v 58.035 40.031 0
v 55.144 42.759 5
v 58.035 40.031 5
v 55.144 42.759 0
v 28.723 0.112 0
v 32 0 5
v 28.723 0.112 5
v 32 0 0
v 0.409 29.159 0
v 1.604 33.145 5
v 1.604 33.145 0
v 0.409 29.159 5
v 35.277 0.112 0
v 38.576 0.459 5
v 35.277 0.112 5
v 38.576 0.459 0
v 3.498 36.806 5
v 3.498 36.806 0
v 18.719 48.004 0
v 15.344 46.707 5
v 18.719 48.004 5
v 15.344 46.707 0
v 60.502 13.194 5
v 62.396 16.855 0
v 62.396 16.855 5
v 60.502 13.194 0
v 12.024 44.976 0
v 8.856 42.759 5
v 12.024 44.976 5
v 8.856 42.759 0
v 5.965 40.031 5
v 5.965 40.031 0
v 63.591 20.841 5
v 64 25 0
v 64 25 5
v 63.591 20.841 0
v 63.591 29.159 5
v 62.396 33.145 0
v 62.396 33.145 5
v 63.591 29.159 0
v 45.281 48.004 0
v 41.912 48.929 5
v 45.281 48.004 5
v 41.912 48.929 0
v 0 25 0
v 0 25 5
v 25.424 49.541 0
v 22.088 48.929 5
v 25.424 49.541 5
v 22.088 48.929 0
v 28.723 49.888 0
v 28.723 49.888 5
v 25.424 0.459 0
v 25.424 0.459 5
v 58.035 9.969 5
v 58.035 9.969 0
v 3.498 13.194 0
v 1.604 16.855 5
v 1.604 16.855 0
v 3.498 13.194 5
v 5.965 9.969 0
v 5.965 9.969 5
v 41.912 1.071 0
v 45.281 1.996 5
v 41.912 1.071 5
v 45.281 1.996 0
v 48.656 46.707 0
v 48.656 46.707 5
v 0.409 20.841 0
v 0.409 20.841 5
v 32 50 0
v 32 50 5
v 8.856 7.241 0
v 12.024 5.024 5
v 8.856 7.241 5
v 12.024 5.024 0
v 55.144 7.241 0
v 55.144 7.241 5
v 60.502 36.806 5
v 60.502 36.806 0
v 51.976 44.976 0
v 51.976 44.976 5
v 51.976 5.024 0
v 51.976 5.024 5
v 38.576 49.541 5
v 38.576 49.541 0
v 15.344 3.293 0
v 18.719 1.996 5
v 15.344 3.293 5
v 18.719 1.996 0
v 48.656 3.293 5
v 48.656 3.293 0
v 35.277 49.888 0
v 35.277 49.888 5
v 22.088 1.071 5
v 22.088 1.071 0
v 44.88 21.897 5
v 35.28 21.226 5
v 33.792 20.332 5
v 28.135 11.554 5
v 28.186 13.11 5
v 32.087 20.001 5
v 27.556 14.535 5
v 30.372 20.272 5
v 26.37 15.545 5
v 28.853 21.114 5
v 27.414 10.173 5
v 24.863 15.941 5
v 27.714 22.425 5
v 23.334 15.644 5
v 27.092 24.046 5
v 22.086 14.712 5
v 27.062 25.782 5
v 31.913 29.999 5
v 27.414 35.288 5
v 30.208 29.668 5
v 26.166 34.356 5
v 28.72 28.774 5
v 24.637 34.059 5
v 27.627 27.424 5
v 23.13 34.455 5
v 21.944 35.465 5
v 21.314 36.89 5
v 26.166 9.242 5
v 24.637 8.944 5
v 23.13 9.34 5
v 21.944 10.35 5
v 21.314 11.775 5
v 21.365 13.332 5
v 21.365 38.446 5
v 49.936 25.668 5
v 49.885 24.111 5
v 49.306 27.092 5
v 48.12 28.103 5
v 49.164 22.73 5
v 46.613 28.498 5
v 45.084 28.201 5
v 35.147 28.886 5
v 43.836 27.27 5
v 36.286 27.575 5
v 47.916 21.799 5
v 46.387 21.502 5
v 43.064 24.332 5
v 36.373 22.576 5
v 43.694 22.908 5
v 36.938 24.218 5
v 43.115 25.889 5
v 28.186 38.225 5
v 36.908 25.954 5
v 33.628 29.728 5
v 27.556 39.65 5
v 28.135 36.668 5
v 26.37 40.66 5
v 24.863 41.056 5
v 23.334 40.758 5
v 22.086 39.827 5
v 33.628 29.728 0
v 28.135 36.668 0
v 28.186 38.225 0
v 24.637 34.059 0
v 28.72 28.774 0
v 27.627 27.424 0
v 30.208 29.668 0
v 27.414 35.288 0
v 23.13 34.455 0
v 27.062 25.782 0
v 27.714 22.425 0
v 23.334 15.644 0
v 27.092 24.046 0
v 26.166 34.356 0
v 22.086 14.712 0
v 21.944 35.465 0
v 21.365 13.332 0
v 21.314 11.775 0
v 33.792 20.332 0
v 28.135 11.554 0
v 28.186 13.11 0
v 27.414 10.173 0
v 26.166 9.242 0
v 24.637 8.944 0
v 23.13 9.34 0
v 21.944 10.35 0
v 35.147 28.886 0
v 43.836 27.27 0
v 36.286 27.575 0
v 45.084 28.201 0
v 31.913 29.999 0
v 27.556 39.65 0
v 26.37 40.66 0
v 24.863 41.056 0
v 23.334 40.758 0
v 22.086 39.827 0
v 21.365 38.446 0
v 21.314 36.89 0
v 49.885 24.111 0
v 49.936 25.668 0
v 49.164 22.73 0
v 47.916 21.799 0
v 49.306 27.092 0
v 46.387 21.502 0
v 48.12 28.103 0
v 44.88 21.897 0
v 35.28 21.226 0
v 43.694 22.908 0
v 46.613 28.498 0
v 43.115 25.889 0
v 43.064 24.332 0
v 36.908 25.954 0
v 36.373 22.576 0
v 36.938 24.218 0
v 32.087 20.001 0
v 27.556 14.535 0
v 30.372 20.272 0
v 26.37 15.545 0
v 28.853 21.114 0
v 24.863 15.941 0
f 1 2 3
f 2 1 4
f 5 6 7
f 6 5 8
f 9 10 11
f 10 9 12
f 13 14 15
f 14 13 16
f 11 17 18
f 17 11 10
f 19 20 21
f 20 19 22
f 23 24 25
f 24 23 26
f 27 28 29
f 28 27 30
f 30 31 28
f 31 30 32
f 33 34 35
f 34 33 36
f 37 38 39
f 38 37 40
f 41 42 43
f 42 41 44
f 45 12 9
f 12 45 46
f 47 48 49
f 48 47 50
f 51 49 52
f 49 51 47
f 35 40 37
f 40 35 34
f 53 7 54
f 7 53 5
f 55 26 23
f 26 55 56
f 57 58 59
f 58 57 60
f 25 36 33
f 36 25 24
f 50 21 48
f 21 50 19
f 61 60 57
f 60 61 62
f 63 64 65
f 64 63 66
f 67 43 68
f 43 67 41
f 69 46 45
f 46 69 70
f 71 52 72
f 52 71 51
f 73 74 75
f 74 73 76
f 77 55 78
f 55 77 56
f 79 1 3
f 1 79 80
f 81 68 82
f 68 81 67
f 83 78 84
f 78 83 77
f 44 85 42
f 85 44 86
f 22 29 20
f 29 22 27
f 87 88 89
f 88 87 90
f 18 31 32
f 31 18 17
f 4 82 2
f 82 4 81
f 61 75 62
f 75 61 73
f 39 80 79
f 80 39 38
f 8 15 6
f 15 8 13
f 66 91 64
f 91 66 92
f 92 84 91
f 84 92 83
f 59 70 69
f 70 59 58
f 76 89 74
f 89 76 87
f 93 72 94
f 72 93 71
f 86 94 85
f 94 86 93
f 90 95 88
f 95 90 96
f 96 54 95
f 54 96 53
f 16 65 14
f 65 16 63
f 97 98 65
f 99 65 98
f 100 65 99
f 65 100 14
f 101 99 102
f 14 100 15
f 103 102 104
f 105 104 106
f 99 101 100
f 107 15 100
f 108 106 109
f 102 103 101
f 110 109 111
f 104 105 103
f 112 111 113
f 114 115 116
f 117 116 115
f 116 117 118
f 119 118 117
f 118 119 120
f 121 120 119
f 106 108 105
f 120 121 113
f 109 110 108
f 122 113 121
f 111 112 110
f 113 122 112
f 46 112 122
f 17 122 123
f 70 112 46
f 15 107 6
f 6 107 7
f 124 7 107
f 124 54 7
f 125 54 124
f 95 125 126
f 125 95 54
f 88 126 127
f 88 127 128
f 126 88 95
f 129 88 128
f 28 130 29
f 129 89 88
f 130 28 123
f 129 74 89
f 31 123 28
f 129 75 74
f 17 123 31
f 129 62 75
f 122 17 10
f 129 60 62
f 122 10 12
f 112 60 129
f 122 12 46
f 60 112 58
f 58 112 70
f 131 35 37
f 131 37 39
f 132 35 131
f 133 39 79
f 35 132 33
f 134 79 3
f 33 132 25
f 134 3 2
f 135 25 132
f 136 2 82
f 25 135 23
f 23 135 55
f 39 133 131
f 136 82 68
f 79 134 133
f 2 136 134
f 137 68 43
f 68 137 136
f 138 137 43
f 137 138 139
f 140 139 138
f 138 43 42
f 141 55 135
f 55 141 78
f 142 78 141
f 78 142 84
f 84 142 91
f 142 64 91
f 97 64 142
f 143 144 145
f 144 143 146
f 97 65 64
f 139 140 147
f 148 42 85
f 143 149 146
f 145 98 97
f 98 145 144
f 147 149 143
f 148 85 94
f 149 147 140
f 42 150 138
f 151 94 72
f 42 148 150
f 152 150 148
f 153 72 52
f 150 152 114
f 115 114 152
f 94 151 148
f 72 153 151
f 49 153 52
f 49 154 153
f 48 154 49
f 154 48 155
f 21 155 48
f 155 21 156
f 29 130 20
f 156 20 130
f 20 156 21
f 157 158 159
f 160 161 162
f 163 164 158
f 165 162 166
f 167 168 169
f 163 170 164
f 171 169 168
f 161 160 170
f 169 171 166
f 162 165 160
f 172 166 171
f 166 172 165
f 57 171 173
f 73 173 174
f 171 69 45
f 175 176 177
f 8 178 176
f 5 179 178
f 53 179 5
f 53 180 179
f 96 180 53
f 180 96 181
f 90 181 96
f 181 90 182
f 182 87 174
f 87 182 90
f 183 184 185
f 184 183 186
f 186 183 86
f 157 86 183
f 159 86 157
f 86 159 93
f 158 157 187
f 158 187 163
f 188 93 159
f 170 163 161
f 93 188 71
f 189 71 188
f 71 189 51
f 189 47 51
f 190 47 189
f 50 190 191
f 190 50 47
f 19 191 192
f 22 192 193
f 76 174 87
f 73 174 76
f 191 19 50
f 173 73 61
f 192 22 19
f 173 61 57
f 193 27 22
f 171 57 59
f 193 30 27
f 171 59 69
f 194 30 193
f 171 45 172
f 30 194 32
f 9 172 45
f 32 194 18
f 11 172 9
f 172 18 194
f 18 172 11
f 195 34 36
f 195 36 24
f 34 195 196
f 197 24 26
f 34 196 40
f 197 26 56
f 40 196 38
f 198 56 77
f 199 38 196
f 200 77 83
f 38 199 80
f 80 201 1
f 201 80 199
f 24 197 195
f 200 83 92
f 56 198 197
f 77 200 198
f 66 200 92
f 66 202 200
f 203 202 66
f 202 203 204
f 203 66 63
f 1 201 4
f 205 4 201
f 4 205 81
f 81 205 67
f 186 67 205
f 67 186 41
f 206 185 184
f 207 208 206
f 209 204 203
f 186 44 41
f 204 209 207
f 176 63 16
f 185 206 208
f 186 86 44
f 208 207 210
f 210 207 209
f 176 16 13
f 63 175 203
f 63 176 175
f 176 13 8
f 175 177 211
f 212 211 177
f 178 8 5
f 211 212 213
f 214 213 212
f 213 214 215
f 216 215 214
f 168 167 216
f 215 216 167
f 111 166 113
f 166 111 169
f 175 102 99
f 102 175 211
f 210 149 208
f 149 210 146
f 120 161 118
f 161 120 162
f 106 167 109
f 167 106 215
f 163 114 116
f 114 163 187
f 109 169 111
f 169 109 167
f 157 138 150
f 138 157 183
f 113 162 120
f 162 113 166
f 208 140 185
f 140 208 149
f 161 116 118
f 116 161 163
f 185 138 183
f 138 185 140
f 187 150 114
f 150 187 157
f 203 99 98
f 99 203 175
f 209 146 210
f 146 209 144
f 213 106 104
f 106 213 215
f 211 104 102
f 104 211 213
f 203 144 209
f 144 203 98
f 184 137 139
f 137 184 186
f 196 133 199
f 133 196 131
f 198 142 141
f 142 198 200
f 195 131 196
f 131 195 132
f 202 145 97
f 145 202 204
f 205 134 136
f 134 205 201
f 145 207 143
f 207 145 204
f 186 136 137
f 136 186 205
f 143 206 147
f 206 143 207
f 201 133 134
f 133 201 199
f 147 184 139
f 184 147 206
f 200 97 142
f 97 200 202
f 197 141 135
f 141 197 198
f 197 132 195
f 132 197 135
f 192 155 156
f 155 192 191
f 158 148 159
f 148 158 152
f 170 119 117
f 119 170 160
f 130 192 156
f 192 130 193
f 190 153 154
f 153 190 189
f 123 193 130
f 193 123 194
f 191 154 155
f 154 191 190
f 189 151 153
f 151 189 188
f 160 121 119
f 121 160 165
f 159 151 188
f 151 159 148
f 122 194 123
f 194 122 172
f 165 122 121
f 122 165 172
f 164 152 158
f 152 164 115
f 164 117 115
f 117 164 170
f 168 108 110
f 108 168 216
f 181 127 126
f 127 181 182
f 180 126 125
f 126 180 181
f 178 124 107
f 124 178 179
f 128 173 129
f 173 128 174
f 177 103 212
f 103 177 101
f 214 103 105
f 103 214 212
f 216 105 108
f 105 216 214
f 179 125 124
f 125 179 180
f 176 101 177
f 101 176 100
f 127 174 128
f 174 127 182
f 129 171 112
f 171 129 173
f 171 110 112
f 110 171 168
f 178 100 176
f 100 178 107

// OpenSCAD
$fn = 32;

// ----------------------------------------------------------------------
// Cam plate: double_lobe cam, base R24
// ----------------------------------------------------------------------

// --- parameters (mm) ---
base_r = 24;              // base circle radius
lobe_h = 8;               // cam lobe rise
bore_r = 5;               // shaft bore radius
plate_t = 5;              // plate thickness, Z (extrusion height)
ring_r = 14.5;            // lightening ring radius
bolt_r = 3.5;             // lightening hole radius
fit_tol = 0.02;           // declared fit tolerance (prompt contract)
free_tol = 0.2;           // declared free tolerance (prompt contract)

profile = [[64, 25], [63.591, 29.159], [62.396, 33.145], [60.502, 36.806], [58.035, 40.031], [55.144, 42.759], [51.976, 44.976], [48.656, 46.707], [45.281, 48.004], [41.912, 48.929], [38.576, 49.541], [35.277, 49.888], [32, 50], [28.723, 49.888], [25.424, 49.541], [22.088, 48.929], [18.719, 48.004], [15.344, 46.707], [12.024, 44.976], [8.856, 42.759], [5.965, 40.031], [3.498, 36.806], [1.604, 33.145], [0.409, 29.159], [0, 25], [0.409, 20.841], [1.604, 16.855], [3.498, 13.194], [5.965, 9.969], [8.856, 7.241], [12.024, 5.024], [15.344, 3.293], [18.719, 1.996], [22.088, 1.071], [25.424, 0.459], [28.723, 0.112], [32, 0], [35.277, 0.112], [38.576, 0.459], [41.912, 1.071], [45.281, 1.996], [48.656, 3.293], [51.976, 5.024], [55.144, 7.241], [58.035, 9.969], [60.502, 13.194], [62.396, 16.855], [63.591, 20.841]];  // primary outline, 48 points, counter clockwise
void_1 = [[36.908, 25.954], [36.286, 27.575], [35.147, 28.886], [33.628, 29.728], [31.913, 29.999], [30.208, 29.668], [28.72, 28.774], [27.627, 27.424], [27.062, 25.782], [27.092, 24.046], [27.714, 22.425], [28.853, 21.114], [30.372, 20.272], [32.087, 20.001], [33.792, 20.332], [35.28, 21.226], [36.373, 22.576], [36.938, 24.218]];  // shaft bore, 18 points
void_2 = [[49.936, 25.668], [49.306, 27.092], [48.12, 28.103], [46.613, 28.498], [45.084, 28.201], [43.836, 27.27], [43.115, 25.889], [43.064, 24.332], [43.694, 22.908], [44.88, 21.897], [46.387, 21.502], [47.916, 21.799], [49.164, 22.73], [49.885, 24.111]];  // lightening hole 1, 14 points
void_3 = [[28.186, 38.225], [27.556, 39.65], [26.37, 40.66], [24.863, 41.056], [23.334, 40.758], [22.086, 39.827], [21.365, 38.446], [21.314, 36.89], [21.944, 35.465], [23.13, 34.455], [24.637, 34.059], [26.166, 34.356], [27.414, 35.288], [28.135, 36.668]];  // lightening hole 2, 14 points
void_4 = [[28.186, 13.11], [27.556, 14.535], [26.37, 15.545], [24.863, 15.941], [23.334, 15.644], [22.086, 14.712], [21.365, 13.332], [21.314, 11.775], [21.944, 10.35], [23.13, 9.34], [24.637, 8.944], [26.166, 9.242], [27.414, 10.173], [28.135, 11.554]];  // lightening hole 3, 14 points

// --- the one profile operation ---
difference() {
  linear_extrude(height = plate_t) polygon(points = profile);
  translate([0, 0, -1])
    linear_extrude(height = plate_t + 2) polygon(points = void_1);
  translate([0, 0, -1])
    linear_extrude(height = plate_t + 2) polygon(points = void_2);
  translate([0, 0, -1])
    linear_extrude(height = plate_t + 2) polygon(points = void_3);
  translate([0, 0, -1])
    linear_extrude(height = plate_t + 2) polygon(points = void_4);
}
